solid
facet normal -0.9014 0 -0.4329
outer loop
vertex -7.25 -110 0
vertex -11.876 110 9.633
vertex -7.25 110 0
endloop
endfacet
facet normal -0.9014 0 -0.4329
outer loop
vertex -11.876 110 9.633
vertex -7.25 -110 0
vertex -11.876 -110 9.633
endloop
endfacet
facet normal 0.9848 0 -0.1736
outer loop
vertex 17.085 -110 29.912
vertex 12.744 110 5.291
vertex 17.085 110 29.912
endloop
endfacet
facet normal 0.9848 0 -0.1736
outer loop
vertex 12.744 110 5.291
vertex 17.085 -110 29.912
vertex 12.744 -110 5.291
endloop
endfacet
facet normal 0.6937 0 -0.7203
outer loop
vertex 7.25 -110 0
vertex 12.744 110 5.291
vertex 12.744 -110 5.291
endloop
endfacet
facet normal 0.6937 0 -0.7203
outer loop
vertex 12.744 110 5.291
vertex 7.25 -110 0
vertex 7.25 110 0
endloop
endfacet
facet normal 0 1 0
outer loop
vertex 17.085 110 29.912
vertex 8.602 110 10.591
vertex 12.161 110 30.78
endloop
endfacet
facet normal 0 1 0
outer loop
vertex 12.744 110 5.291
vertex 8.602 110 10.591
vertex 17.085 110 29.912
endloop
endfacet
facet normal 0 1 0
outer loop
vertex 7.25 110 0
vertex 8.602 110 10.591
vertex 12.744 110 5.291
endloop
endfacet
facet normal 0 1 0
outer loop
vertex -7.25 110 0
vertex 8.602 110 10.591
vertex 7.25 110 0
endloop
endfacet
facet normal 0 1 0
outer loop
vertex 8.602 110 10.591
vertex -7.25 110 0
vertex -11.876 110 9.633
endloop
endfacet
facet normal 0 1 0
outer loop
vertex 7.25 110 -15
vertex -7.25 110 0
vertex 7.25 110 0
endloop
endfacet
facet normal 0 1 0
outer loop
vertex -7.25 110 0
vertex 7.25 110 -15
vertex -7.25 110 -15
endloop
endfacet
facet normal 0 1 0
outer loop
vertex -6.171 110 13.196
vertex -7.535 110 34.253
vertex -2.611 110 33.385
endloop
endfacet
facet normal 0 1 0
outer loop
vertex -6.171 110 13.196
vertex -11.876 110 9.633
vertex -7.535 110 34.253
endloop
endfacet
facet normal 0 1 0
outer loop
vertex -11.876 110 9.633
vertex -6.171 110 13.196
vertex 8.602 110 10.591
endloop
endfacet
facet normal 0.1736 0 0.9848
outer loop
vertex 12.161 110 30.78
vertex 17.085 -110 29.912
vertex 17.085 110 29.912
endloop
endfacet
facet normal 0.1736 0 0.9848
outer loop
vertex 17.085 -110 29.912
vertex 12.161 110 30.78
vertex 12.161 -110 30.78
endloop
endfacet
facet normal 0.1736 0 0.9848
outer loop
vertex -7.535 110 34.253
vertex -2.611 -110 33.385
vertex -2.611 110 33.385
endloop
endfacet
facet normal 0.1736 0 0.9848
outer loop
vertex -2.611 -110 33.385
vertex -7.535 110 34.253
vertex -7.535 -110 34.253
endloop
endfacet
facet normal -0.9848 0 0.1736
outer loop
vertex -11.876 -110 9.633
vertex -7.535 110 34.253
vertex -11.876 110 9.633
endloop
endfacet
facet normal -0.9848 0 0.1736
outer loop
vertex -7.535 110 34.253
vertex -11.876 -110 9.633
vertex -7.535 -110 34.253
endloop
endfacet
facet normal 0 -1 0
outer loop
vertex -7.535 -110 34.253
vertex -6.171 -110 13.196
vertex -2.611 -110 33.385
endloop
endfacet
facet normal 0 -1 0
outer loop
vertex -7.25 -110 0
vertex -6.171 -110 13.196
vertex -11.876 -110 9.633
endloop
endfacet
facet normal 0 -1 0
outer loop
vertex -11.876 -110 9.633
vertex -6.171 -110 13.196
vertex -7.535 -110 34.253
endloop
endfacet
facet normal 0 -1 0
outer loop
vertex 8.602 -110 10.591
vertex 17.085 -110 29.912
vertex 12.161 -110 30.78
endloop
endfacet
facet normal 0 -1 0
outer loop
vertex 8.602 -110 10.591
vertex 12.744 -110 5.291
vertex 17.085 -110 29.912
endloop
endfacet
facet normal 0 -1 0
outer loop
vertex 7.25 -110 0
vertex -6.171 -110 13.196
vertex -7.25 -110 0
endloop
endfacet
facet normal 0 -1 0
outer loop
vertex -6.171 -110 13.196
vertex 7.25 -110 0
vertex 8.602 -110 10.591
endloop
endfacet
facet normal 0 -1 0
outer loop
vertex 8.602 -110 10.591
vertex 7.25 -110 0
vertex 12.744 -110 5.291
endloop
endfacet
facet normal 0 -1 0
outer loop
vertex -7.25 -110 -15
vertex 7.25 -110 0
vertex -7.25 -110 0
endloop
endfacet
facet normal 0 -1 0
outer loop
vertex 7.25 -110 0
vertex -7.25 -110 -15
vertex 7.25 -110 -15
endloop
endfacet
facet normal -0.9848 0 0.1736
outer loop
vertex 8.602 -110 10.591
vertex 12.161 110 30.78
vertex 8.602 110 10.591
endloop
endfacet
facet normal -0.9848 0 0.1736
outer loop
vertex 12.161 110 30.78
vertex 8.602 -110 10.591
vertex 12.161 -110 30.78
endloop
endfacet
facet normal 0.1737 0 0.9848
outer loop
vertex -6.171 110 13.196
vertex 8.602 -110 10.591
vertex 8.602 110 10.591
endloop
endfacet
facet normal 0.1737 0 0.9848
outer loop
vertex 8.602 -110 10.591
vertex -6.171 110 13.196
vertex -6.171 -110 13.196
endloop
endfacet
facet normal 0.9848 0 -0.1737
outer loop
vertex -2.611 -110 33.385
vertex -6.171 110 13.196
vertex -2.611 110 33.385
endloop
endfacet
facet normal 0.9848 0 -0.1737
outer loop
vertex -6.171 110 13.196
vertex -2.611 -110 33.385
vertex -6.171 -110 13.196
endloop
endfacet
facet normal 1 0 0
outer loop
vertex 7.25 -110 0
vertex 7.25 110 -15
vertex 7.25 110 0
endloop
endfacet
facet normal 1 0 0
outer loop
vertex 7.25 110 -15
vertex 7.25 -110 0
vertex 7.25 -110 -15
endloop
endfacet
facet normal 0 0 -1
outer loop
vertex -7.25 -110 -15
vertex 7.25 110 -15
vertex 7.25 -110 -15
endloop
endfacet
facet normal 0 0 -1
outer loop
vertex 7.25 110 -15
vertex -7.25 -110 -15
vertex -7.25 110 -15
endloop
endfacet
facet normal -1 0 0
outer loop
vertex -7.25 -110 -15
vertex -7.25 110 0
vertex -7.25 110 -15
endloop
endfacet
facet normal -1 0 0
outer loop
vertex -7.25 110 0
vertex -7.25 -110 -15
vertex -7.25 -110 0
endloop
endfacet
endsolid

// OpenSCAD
$fn=100;
/*

Object Name: Adapter For Laptop Chest Stand (OpenSCAD)
Author: Brian Khuu 2021

*/

adapterL=220;
adapterH=20-5;
adapterAngle=10; 

currGapW=15-0.5;
newGapW=15;
newGapH=20;
newGapThickness=10;

translate([0,0,-adapterH/2])
    cube([currGapW,adapterL,adapterH], center=true);

difference()
{
    hull()
    {       
        translate([0,0,+5])
            cube([currGapW,adapterL,10], center=true);
        translate([0,0,+5])
            rotate([0,adapterAngle,0])
            translate([0,0,+10+5])
            cube([newGapW+newGapThickness,adapterL,newGapH+5], center=true);
    }

    translate([0,0,+5])
        rotate([0,adapterAngle,0])
        translate([0,0,+10+5+4])
        cube([newGapW,adapterL+1,newGapH+4], center=true);
}
